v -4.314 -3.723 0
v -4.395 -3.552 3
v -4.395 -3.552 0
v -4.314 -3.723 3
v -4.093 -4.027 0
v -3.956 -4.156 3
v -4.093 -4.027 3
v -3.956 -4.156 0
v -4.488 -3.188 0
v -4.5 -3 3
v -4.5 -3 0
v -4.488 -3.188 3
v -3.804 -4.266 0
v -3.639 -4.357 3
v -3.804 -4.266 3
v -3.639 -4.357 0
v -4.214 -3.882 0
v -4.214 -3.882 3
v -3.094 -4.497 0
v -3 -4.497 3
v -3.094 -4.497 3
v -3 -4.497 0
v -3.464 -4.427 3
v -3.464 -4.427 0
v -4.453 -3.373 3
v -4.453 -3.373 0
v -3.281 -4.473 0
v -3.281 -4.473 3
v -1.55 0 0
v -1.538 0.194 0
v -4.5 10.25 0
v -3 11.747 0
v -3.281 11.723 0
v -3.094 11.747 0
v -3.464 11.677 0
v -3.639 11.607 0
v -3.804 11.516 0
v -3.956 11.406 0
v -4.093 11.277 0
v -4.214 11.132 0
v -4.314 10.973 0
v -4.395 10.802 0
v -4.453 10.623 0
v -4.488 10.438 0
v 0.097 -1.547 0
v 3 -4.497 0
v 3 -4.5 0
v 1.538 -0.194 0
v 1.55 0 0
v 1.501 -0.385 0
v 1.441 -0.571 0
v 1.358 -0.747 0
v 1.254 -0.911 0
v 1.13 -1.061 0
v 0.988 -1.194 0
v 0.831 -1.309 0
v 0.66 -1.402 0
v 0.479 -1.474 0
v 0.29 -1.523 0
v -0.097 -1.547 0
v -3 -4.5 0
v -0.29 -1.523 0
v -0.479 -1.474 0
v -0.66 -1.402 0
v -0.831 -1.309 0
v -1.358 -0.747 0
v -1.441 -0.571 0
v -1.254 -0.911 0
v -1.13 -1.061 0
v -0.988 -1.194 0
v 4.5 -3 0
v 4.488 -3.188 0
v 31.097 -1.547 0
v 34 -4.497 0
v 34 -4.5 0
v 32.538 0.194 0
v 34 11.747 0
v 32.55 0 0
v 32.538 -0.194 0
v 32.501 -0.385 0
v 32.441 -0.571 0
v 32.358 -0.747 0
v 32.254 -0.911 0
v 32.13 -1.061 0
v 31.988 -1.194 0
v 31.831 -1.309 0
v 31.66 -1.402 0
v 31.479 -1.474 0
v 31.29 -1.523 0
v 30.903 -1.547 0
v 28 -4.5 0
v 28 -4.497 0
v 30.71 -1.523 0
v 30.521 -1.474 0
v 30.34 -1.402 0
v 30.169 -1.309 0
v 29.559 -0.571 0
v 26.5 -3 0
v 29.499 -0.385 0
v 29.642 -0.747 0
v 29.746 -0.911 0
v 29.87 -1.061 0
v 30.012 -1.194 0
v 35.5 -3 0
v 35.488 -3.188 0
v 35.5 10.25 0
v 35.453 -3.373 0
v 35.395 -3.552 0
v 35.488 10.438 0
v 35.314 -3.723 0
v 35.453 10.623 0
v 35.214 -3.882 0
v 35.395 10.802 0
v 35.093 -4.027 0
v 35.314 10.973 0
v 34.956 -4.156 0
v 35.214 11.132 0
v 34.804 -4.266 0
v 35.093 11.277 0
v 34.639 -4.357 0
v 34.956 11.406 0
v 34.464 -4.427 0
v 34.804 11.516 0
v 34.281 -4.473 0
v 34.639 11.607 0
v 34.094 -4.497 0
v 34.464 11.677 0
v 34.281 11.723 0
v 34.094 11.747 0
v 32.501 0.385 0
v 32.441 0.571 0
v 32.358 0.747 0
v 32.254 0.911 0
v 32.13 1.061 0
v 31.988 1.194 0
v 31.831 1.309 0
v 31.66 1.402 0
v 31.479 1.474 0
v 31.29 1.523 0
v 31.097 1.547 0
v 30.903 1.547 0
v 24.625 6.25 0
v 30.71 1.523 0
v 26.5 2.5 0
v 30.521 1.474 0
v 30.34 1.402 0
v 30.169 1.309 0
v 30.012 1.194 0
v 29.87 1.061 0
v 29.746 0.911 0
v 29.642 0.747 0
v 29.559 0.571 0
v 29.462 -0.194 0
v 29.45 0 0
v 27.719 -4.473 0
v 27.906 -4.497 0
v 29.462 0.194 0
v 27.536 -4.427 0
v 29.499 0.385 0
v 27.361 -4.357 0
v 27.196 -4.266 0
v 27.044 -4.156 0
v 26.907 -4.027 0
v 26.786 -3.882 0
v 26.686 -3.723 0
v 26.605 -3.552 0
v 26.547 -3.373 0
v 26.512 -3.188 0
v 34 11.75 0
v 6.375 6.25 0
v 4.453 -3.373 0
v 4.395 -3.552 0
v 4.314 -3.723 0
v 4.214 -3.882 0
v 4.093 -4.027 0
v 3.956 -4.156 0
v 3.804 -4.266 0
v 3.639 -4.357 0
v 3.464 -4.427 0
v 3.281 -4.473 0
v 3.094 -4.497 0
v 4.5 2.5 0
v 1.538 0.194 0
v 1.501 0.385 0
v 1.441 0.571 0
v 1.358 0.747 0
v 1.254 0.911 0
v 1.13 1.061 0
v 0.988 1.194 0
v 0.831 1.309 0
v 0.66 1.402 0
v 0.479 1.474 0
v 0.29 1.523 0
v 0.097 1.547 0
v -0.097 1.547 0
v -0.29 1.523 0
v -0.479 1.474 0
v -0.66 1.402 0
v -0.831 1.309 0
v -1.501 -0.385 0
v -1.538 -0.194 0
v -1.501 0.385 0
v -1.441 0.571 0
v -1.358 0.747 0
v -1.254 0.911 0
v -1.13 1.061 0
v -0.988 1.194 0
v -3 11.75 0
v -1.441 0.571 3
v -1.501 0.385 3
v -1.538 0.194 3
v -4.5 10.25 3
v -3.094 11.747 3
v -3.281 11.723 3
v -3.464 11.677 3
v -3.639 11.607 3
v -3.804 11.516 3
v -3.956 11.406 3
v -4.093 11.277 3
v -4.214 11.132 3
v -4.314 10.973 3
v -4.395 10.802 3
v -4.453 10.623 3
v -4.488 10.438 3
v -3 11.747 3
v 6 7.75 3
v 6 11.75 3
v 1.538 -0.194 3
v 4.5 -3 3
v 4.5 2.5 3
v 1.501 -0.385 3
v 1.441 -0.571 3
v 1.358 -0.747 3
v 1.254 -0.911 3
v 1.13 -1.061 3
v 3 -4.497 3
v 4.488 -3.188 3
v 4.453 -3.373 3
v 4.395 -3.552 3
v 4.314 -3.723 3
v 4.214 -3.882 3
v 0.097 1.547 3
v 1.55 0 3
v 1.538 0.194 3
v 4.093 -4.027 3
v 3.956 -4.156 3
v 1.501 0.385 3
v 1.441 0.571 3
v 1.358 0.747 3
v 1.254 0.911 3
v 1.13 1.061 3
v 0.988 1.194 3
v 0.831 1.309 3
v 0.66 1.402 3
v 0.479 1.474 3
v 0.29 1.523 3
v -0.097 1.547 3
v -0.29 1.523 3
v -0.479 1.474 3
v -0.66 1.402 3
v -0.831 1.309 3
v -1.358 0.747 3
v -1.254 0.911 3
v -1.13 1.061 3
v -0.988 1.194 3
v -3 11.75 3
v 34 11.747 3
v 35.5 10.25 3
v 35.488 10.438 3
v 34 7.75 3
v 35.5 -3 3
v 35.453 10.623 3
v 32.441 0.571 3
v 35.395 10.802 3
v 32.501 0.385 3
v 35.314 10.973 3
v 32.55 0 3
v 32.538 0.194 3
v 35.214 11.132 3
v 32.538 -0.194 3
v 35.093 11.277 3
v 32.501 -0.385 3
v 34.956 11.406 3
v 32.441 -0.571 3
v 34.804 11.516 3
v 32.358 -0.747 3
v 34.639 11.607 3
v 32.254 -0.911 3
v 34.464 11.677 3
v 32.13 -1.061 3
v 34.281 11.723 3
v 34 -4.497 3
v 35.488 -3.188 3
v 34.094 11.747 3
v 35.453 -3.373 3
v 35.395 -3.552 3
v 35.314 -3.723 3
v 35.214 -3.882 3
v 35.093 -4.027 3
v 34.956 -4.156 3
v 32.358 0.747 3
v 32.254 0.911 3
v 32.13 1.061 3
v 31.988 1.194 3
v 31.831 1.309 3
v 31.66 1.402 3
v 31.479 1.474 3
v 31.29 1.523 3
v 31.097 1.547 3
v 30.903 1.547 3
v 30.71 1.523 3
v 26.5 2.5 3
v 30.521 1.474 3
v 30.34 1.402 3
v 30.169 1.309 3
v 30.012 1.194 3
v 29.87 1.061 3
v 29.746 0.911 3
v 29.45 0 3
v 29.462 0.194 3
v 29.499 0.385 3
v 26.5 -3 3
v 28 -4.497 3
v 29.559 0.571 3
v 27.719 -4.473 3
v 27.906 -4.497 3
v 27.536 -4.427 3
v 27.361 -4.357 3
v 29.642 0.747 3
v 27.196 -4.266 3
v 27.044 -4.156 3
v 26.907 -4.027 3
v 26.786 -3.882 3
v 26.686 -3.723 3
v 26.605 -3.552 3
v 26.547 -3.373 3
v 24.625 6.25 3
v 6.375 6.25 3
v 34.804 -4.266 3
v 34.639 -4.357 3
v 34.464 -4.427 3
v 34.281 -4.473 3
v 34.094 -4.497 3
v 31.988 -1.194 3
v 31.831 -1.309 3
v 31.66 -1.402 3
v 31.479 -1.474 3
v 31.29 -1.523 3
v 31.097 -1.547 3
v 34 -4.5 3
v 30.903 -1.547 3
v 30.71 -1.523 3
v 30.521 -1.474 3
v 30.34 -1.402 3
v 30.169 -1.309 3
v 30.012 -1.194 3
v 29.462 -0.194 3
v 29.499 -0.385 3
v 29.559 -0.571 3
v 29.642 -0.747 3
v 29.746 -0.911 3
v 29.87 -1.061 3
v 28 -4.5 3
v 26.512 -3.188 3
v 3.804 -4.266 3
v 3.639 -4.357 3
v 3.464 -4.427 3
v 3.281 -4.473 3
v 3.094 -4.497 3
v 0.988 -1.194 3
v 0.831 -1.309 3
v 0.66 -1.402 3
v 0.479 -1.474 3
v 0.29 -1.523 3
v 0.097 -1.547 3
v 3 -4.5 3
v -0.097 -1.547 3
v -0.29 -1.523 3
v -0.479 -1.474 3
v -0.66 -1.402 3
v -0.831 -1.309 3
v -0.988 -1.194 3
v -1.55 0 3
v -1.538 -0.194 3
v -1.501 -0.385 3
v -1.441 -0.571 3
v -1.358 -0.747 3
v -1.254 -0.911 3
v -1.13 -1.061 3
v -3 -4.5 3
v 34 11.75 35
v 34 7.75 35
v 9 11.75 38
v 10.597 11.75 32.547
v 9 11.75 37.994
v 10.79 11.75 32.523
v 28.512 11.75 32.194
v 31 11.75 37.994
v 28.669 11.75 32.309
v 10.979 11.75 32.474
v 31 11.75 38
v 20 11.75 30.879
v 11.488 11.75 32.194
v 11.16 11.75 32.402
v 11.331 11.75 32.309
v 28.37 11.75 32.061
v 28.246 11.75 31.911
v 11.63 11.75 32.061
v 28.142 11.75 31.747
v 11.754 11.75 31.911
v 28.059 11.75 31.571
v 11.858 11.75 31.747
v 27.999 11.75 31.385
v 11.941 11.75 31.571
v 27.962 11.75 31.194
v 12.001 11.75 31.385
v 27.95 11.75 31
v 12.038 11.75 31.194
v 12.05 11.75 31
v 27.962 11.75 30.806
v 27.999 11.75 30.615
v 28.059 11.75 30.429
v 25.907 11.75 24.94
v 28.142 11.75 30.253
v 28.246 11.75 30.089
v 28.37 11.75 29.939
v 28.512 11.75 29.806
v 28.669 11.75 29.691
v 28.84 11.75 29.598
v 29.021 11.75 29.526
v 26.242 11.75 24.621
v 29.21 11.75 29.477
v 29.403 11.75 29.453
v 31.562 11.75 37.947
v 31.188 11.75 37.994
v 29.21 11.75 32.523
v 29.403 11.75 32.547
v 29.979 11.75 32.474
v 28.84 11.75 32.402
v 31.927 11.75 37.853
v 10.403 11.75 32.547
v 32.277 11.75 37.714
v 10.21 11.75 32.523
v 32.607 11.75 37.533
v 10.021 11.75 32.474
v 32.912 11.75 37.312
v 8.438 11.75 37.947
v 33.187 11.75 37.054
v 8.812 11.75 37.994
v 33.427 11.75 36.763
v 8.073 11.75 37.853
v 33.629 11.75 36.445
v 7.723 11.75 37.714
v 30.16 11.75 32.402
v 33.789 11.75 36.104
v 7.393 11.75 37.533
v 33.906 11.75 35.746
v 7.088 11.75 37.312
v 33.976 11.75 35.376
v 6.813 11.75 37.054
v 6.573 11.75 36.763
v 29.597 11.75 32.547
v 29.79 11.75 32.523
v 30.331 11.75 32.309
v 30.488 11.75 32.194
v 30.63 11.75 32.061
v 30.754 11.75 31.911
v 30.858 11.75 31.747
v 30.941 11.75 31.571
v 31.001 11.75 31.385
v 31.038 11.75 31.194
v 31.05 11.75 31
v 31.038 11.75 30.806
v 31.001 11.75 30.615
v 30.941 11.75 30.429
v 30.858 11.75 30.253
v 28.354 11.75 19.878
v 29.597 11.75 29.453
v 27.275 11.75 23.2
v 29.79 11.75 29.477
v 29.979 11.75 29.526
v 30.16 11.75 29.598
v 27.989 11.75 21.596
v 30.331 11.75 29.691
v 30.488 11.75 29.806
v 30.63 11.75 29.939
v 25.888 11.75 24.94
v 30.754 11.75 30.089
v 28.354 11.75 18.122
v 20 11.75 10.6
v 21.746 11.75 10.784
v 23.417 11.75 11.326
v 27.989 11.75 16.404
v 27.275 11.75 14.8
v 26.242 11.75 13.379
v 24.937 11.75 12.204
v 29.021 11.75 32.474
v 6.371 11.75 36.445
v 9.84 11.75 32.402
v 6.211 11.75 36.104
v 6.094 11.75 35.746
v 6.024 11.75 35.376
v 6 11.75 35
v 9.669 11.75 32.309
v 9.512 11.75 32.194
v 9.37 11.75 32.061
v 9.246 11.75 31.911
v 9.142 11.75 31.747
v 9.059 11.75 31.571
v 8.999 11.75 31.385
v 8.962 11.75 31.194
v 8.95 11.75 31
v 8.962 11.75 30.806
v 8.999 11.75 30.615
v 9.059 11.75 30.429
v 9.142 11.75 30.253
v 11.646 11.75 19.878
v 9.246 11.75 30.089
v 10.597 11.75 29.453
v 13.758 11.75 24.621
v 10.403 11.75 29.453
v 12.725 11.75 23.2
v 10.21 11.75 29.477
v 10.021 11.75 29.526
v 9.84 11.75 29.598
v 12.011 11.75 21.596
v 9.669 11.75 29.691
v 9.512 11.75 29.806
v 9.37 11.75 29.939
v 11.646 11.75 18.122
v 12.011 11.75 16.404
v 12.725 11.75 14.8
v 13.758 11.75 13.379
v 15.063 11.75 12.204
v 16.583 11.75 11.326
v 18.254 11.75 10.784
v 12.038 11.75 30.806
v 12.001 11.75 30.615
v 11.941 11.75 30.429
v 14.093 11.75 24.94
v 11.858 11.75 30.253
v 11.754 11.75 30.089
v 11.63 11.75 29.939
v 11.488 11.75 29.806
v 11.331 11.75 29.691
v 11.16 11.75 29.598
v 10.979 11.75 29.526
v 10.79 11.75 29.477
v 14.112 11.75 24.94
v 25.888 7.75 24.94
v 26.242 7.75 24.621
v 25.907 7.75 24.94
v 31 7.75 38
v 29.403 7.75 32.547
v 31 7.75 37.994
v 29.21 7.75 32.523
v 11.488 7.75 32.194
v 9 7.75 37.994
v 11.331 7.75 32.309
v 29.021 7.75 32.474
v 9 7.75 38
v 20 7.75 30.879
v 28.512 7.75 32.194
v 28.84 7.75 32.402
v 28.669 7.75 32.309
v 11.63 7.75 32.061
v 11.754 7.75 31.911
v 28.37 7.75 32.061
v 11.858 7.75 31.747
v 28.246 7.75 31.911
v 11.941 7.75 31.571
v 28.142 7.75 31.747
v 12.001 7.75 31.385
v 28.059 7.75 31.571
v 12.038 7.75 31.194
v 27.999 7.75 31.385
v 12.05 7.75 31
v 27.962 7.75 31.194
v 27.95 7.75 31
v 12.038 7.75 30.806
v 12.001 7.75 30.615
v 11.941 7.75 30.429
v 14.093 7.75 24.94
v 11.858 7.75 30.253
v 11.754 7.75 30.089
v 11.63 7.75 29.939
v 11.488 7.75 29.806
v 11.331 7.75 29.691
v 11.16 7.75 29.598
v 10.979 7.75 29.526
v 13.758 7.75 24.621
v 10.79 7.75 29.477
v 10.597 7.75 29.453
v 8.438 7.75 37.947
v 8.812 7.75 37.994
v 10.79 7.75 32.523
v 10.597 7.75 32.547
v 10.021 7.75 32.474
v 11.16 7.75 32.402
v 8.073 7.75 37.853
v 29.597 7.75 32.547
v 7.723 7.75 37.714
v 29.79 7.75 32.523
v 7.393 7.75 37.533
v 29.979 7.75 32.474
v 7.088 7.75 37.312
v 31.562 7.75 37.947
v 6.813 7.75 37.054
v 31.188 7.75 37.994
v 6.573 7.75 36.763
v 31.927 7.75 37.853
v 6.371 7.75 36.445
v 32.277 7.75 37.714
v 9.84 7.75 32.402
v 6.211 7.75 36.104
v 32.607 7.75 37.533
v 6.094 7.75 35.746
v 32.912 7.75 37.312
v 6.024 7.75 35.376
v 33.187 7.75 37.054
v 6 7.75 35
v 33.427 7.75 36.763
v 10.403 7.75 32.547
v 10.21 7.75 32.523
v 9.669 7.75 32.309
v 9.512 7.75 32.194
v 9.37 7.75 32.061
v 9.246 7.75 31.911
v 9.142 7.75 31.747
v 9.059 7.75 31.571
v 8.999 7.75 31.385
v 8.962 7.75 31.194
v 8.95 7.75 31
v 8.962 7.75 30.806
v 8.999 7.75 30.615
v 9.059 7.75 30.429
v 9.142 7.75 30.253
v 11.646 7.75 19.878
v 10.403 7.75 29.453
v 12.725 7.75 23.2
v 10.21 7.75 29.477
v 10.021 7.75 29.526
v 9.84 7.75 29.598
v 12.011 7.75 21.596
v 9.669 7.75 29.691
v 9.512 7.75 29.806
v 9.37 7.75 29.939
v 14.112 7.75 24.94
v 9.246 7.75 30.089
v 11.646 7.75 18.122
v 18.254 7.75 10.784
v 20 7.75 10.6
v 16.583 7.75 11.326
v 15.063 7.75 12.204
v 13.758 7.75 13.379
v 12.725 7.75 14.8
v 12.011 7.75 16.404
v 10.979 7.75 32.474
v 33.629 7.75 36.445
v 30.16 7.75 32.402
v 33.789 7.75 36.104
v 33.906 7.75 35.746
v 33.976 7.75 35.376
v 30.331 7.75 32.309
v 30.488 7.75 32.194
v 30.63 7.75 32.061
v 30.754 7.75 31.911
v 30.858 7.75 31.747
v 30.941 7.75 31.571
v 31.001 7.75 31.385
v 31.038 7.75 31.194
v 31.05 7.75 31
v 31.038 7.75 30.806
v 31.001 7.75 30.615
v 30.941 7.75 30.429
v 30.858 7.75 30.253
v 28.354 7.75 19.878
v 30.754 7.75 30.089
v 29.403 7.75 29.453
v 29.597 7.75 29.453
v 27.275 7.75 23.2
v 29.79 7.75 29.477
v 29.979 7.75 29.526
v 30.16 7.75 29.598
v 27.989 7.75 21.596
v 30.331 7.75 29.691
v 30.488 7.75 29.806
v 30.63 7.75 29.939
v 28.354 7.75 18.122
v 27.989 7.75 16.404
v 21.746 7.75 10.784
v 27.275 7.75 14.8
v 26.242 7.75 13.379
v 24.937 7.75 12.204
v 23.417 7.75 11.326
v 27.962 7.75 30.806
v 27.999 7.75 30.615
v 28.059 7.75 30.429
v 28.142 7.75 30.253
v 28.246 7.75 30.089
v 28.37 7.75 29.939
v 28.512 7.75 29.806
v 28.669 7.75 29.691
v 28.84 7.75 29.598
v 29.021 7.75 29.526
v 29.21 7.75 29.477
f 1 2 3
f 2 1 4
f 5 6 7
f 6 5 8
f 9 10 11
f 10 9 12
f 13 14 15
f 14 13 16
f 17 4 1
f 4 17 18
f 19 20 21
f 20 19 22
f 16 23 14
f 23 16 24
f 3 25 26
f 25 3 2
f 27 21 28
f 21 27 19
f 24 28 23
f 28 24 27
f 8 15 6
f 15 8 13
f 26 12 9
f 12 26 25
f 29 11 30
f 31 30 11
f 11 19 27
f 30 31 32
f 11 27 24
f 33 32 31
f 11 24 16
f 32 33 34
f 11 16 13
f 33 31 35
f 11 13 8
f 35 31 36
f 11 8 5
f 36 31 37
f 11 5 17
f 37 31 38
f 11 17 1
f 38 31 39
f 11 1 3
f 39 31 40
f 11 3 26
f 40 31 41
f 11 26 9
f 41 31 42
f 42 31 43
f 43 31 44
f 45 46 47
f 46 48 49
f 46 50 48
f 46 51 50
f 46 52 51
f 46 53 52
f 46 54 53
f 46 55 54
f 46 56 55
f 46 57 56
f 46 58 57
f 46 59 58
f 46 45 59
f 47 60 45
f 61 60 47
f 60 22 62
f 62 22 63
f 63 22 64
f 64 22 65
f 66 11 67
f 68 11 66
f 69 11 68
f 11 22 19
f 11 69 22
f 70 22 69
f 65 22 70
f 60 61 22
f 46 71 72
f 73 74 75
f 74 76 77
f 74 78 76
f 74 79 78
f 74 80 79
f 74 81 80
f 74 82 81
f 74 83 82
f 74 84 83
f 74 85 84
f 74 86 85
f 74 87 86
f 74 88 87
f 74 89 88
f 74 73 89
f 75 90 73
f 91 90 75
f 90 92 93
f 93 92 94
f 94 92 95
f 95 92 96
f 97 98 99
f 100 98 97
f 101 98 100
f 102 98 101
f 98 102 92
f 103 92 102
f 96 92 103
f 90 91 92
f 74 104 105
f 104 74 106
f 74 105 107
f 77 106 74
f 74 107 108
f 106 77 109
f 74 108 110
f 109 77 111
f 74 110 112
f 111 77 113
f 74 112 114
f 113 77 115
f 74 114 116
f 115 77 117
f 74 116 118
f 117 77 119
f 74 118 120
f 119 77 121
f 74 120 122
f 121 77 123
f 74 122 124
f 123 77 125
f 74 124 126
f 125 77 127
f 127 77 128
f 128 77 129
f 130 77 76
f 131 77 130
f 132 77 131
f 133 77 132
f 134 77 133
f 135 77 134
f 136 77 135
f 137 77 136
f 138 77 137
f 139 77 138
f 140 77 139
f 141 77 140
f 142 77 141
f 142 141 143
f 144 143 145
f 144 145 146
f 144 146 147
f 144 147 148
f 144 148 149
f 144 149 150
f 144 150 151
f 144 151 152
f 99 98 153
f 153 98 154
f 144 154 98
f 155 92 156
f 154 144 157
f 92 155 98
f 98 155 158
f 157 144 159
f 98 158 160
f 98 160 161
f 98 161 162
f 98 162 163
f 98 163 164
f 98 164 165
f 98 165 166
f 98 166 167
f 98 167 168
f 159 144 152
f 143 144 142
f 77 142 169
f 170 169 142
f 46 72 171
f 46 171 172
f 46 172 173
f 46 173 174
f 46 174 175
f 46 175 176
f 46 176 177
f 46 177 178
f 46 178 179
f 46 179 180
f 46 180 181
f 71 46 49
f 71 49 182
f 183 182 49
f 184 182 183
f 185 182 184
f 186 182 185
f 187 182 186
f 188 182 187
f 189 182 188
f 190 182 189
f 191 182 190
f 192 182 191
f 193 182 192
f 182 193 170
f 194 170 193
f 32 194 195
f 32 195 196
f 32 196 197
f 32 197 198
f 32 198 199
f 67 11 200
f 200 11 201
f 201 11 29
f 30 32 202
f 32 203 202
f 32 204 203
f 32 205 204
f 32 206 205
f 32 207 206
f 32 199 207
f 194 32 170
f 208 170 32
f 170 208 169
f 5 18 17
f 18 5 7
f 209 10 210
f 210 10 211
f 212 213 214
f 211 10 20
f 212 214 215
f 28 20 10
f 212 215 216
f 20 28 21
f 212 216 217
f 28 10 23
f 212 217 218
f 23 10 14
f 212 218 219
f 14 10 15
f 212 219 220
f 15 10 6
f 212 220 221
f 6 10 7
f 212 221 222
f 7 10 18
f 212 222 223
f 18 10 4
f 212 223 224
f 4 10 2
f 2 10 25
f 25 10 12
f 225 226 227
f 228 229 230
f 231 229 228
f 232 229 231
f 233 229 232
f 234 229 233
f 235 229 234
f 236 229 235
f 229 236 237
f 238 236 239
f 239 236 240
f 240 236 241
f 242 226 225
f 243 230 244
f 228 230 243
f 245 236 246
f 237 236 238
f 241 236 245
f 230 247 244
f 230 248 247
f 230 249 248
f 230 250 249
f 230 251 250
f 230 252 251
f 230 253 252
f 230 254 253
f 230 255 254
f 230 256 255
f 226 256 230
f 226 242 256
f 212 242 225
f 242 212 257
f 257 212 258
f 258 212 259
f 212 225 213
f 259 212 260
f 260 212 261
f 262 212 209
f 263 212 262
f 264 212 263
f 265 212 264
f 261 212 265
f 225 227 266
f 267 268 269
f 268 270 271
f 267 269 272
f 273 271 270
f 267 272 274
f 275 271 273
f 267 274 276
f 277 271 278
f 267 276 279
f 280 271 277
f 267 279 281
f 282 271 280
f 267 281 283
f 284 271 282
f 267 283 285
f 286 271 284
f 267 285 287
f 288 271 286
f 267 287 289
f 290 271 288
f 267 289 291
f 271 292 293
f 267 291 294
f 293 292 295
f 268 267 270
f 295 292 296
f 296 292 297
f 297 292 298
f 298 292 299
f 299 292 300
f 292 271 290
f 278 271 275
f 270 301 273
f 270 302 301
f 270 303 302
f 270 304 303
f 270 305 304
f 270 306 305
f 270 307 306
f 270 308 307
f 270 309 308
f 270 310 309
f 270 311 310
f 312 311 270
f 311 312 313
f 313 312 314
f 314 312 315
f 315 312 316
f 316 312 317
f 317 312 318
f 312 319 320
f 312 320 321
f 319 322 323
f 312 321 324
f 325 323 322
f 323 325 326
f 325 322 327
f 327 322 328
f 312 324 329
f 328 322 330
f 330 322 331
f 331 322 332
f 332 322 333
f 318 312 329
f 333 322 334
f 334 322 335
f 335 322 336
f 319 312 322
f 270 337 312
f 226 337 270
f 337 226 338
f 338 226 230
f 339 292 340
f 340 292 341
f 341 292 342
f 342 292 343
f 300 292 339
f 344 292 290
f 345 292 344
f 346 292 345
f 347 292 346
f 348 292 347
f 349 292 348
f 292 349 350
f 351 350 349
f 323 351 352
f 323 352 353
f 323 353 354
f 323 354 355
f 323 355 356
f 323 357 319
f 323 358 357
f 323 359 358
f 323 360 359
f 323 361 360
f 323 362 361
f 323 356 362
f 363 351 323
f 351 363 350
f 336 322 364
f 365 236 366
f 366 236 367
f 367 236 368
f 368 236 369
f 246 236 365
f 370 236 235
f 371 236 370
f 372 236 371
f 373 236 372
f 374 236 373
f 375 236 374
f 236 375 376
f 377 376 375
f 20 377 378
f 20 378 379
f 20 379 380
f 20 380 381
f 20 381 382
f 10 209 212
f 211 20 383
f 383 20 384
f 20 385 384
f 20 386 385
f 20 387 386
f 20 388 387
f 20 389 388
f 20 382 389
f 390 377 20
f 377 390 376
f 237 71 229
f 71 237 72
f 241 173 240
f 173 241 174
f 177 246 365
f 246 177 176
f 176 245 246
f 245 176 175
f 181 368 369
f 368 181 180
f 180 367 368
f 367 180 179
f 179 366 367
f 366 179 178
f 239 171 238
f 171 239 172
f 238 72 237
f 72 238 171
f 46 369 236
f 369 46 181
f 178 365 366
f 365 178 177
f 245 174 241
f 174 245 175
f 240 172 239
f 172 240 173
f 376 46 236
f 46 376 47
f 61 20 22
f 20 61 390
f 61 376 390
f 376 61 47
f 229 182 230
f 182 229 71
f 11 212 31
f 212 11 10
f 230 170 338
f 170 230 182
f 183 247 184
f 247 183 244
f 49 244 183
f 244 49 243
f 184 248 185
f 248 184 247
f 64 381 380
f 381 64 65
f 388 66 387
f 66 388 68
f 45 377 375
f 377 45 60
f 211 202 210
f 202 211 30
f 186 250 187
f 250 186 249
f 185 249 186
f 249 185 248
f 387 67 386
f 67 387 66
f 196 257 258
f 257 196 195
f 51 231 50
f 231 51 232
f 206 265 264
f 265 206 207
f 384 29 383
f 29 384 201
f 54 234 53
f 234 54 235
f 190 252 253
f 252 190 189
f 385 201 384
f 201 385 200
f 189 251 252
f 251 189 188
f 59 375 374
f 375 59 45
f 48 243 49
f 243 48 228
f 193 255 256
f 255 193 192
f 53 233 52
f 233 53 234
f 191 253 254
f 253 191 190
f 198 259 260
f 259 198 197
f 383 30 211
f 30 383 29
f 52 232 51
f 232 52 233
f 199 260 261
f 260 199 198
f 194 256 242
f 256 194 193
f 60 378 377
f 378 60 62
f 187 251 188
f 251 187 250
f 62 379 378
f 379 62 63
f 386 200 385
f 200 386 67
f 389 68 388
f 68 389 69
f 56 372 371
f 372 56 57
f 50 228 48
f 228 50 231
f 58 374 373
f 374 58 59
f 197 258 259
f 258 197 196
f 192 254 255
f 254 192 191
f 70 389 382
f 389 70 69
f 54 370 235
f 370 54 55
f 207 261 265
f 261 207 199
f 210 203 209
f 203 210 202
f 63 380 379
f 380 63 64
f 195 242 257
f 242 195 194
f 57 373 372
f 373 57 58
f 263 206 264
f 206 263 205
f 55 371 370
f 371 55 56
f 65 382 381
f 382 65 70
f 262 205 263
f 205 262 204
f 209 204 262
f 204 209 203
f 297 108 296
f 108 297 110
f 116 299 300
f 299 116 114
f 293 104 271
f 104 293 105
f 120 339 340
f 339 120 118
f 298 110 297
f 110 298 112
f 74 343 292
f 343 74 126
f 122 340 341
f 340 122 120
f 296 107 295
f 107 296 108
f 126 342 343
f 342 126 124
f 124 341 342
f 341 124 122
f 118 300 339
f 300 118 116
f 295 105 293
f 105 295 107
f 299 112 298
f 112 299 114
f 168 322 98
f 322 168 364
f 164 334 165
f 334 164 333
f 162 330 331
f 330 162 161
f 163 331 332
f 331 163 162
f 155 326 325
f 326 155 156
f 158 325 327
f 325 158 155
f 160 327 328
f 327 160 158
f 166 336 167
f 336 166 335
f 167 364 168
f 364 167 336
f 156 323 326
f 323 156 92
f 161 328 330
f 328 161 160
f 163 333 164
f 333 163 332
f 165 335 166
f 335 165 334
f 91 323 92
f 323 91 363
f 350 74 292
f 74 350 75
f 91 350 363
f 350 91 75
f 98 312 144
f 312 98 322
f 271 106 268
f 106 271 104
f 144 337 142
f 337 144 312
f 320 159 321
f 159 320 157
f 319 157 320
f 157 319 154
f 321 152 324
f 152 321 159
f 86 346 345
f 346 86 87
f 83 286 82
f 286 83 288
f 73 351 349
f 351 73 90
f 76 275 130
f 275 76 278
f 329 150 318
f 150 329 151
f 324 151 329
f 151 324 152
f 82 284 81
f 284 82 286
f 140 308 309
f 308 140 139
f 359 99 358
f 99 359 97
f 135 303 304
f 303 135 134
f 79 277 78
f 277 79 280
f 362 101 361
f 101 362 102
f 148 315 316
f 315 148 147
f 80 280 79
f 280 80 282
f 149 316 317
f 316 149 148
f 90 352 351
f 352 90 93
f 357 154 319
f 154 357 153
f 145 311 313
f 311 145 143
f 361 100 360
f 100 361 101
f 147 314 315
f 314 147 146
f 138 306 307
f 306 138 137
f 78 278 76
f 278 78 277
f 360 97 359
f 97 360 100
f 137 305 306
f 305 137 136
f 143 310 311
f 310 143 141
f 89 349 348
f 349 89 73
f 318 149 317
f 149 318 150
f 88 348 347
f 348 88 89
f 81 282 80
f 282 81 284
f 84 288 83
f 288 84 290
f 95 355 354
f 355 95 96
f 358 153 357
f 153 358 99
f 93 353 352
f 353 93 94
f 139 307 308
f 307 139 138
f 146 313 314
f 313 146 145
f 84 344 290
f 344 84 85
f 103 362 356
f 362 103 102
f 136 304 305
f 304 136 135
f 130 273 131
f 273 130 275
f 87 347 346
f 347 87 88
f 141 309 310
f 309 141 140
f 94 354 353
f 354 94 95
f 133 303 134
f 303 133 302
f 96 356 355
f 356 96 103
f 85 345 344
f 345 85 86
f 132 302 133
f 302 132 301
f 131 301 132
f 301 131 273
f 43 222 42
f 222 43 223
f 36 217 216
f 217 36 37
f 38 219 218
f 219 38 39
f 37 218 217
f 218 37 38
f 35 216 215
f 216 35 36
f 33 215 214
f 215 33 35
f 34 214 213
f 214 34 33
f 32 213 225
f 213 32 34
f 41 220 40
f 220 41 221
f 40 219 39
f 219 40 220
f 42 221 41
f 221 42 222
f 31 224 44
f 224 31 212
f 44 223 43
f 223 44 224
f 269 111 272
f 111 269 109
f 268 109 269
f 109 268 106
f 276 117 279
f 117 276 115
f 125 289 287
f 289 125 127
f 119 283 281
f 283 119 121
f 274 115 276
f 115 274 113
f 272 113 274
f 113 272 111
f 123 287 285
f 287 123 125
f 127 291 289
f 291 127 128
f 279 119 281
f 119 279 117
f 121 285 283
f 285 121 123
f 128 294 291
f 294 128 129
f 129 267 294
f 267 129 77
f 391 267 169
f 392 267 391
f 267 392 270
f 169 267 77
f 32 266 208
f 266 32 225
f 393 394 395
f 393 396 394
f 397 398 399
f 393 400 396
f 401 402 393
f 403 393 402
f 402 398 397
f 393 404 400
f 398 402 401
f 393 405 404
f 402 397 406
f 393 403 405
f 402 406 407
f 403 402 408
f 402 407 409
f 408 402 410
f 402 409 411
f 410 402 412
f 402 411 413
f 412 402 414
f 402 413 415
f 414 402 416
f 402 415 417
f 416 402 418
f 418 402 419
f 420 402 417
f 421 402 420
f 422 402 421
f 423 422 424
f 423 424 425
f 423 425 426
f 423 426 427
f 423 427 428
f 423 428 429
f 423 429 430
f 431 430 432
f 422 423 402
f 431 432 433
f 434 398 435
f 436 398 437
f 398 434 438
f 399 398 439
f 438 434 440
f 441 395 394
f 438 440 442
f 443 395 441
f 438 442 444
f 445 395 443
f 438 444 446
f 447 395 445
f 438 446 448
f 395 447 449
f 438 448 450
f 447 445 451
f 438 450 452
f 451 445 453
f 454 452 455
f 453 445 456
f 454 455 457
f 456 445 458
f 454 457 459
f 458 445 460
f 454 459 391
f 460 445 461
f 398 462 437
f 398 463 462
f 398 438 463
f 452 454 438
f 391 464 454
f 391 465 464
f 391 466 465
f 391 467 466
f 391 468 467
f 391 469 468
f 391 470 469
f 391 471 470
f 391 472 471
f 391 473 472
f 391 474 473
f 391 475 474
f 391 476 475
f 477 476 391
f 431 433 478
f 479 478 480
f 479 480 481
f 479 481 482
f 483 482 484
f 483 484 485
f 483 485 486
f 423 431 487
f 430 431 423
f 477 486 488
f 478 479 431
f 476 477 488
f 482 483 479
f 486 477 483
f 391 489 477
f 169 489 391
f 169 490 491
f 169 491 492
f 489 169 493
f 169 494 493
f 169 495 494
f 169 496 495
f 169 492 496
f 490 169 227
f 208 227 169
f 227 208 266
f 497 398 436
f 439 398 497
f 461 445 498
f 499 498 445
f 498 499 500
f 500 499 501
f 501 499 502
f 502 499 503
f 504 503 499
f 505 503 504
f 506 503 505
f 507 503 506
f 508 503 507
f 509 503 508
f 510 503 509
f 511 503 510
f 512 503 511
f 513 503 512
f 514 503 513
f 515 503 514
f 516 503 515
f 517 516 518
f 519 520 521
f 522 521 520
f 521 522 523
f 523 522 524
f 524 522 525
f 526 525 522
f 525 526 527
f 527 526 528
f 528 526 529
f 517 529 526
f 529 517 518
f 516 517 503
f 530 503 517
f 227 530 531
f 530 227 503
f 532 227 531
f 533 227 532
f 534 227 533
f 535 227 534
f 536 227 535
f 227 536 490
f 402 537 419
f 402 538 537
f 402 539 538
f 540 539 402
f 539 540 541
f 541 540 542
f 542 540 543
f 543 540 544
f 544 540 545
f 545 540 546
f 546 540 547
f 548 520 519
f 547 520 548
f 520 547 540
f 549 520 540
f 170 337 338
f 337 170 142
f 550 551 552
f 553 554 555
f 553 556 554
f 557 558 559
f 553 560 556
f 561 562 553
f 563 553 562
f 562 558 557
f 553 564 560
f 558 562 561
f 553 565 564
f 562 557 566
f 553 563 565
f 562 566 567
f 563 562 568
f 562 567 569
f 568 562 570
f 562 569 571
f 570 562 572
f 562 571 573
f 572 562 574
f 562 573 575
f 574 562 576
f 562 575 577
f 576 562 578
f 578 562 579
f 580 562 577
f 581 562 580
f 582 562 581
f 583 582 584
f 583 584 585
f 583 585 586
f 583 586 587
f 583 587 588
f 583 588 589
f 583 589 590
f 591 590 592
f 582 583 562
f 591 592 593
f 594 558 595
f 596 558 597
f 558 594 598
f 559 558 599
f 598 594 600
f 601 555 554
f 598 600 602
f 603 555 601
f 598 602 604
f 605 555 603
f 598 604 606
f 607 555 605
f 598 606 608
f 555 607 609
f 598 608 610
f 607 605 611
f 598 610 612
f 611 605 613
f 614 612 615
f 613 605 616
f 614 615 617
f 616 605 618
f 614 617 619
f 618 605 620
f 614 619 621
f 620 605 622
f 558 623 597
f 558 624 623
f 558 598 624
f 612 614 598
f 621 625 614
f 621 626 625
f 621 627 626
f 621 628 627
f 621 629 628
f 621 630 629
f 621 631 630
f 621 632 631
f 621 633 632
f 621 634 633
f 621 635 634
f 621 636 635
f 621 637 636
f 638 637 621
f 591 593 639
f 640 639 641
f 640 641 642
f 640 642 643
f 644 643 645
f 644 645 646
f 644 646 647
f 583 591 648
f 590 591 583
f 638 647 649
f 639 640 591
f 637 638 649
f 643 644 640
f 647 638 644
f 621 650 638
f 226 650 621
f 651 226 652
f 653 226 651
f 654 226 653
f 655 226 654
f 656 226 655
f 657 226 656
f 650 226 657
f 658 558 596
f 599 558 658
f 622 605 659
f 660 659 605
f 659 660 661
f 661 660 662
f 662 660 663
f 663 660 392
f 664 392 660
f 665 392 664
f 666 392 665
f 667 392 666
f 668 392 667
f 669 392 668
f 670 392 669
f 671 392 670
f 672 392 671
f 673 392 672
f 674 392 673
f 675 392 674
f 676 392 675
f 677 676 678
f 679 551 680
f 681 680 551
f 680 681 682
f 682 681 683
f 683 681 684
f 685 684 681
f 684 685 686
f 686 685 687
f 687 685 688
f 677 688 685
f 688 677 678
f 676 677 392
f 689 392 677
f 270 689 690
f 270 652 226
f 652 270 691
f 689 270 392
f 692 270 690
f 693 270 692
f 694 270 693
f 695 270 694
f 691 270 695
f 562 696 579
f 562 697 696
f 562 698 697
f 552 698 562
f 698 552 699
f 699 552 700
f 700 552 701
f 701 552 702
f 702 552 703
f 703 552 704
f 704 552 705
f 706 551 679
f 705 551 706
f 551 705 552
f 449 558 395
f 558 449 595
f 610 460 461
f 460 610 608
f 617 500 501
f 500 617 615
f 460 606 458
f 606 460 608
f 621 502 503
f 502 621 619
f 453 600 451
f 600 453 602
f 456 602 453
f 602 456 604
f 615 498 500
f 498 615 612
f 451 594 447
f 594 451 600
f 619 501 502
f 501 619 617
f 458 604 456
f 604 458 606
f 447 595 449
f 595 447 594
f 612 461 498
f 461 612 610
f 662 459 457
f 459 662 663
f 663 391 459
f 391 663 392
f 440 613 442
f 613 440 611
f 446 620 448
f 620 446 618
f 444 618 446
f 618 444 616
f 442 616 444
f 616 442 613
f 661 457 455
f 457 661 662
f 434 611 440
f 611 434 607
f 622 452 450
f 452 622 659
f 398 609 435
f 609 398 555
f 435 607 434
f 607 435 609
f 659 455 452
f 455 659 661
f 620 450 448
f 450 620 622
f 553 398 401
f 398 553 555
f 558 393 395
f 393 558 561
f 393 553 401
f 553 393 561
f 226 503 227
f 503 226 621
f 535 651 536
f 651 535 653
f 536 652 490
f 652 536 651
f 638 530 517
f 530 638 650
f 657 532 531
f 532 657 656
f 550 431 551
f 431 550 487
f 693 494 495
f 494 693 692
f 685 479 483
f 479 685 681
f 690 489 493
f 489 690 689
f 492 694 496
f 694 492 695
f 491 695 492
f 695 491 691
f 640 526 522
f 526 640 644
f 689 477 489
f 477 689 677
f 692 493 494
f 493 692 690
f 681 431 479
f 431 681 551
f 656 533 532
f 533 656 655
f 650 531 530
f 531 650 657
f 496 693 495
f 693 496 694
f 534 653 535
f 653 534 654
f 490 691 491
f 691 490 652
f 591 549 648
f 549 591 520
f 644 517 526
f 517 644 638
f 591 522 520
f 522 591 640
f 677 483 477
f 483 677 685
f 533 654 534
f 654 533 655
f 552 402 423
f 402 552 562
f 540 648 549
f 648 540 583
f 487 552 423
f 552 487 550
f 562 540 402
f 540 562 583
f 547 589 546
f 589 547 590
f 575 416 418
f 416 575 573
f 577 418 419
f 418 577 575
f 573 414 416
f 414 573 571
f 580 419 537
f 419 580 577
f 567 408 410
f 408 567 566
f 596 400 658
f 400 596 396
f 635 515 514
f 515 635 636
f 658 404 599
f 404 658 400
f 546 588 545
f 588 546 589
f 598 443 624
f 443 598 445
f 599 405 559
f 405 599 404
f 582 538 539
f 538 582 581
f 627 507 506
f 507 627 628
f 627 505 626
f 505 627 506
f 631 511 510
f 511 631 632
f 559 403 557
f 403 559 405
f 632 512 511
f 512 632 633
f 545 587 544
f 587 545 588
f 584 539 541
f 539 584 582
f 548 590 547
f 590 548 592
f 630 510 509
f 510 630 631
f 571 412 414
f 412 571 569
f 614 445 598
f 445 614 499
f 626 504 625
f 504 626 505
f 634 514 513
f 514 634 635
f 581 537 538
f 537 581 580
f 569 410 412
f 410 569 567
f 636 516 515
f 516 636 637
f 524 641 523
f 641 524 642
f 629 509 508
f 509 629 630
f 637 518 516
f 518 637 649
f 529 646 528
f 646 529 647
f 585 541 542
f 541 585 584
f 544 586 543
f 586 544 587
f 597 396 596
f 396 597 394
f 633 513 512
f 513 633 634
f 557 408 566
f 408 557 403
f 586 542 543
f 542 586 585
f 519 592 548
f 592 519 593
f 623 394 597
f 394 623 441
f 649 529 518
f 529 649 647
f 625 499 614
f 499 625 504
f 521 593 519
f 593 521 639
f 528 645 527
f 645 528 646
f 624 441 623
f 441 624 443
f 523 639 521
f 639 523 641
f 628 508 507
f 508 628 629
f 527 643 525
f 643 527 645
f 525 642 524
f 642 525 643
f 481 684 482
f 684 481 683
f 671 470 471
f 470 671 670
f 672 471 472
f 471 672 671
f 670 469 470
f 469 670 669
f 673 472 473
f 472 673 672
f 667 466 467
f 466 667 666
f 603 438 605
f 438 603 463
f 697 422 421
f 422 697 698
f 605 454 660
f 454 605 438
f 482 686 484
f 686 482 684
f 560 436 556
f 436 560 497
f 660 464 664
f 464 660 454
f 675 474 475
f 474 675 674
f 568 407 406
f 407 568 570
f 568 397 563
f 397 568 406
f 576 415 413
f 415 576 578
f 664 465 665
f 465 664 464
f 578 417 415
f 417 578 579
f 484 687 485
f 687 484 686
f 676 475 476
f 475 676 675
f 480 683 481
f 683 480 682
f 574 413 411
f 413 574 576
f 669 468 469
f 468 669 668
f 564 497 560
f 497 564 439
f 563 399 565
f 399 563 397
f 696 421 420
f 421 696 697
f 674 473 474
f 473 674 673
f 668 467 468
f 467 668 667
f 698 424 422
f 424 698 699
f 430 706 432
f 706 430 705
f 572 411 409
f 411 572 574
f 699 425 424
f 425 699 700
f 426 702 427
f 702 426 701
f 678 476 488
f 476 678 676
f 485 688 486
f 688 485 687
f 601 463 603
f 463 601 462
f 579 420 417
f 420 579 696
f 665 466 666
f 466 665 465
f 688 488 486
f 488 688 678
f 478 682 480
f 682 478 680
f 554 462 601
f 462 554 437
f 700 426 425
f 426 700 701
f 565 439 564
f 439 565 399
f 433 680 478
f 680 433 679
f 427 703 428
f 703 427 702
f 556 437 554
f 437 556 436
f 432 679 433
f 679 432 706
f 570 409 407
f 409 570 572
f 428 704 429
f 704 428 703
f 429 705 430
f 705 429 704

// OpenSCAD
use <MCAD/boxes.scad>
use <MCAD/triangles.scad>
use <MCAD/teardrop.scad>

thick = 4;
supportHeight = 38;
screwDiam = 3.5;
$fn= 50;

baseHeight = 3;
diamVis = 3; // M3 screw
xBase = 31+3*diamVis;


union() {
	blosVis(3*diamVis, diamVis, baseHeight);
	translate([31,0,0]) mirror() blosVis(3*diamVis, diamVis, baseHeight);
	#translate([-1.5*diamVis+0.5*xBase, 1.5*diamVis+4.5, 0.5*baseHeight]) 
		roundedBox([xBase, 5.5, baseHeight], 0.5*diamVis, true);
	// Tune translation
	translate([6, 1.5*diamVis+6.75, 0]) 
		rotate([90,0,0]) back();
}


module blosVis(length, diamHole, height) {
	 translate([0,0,0.5*height]) 
	 difference() {
			union() {
				roundedBox([length,length,height], 0.5*height, true);
				translate([0,0.5*length,0]) 
					cube([length,2*diamHole+1,height], true);
				#translate([0.5*length,0.5*length+diamHole+1,-0.5*height]) 
					rotate([0,0,-90]) 
					triangle(diamHole, 2*diamHole, height);
			}
			translate([0,0, -height]) cylinder(d=diamHole+0.1, h=3*height);
		}
};

module back() {
	endStopWidth = 19; // Holes distance in endstop module
	sideMargin = 3;
	minWidth = endStopWidth+diamVis+sideMargin*2;
	zTrans = 31;

	difference() {
		translate([0.5*minWidth,0.5*supportHeight,0.5*baseHeight]) 
				roundedBox([minWidth, supportHeight, thick], baseHeight, true);
		
		translate([sideMargin+diamVis/2, zTrans, -thick]) 
			//hull() {
			 	cylinder(d=diamVis+0.1, h=3*thick);
				//translate([0, -10, 0]) cylinder(d=diamVis+0.1, h=3*thick);
		//}
		translate([minWidth-(sideMargin+diamVis/2), zTrans, -thick]) 
			//hull() {
			 	cylinder(d=diamVis+0.1, h=3*thick);
				//translate([0, -10, 0]) cylinder(d=diamVis+0.1, h=3*thick);
		//}
	 	#translate([0.5*minWidth, 0.5*supportHeight, thick]) 
		rotate([0, 90, 90]) teardrop(0.3*minWidth, 3*thick, 90);
	}
};
